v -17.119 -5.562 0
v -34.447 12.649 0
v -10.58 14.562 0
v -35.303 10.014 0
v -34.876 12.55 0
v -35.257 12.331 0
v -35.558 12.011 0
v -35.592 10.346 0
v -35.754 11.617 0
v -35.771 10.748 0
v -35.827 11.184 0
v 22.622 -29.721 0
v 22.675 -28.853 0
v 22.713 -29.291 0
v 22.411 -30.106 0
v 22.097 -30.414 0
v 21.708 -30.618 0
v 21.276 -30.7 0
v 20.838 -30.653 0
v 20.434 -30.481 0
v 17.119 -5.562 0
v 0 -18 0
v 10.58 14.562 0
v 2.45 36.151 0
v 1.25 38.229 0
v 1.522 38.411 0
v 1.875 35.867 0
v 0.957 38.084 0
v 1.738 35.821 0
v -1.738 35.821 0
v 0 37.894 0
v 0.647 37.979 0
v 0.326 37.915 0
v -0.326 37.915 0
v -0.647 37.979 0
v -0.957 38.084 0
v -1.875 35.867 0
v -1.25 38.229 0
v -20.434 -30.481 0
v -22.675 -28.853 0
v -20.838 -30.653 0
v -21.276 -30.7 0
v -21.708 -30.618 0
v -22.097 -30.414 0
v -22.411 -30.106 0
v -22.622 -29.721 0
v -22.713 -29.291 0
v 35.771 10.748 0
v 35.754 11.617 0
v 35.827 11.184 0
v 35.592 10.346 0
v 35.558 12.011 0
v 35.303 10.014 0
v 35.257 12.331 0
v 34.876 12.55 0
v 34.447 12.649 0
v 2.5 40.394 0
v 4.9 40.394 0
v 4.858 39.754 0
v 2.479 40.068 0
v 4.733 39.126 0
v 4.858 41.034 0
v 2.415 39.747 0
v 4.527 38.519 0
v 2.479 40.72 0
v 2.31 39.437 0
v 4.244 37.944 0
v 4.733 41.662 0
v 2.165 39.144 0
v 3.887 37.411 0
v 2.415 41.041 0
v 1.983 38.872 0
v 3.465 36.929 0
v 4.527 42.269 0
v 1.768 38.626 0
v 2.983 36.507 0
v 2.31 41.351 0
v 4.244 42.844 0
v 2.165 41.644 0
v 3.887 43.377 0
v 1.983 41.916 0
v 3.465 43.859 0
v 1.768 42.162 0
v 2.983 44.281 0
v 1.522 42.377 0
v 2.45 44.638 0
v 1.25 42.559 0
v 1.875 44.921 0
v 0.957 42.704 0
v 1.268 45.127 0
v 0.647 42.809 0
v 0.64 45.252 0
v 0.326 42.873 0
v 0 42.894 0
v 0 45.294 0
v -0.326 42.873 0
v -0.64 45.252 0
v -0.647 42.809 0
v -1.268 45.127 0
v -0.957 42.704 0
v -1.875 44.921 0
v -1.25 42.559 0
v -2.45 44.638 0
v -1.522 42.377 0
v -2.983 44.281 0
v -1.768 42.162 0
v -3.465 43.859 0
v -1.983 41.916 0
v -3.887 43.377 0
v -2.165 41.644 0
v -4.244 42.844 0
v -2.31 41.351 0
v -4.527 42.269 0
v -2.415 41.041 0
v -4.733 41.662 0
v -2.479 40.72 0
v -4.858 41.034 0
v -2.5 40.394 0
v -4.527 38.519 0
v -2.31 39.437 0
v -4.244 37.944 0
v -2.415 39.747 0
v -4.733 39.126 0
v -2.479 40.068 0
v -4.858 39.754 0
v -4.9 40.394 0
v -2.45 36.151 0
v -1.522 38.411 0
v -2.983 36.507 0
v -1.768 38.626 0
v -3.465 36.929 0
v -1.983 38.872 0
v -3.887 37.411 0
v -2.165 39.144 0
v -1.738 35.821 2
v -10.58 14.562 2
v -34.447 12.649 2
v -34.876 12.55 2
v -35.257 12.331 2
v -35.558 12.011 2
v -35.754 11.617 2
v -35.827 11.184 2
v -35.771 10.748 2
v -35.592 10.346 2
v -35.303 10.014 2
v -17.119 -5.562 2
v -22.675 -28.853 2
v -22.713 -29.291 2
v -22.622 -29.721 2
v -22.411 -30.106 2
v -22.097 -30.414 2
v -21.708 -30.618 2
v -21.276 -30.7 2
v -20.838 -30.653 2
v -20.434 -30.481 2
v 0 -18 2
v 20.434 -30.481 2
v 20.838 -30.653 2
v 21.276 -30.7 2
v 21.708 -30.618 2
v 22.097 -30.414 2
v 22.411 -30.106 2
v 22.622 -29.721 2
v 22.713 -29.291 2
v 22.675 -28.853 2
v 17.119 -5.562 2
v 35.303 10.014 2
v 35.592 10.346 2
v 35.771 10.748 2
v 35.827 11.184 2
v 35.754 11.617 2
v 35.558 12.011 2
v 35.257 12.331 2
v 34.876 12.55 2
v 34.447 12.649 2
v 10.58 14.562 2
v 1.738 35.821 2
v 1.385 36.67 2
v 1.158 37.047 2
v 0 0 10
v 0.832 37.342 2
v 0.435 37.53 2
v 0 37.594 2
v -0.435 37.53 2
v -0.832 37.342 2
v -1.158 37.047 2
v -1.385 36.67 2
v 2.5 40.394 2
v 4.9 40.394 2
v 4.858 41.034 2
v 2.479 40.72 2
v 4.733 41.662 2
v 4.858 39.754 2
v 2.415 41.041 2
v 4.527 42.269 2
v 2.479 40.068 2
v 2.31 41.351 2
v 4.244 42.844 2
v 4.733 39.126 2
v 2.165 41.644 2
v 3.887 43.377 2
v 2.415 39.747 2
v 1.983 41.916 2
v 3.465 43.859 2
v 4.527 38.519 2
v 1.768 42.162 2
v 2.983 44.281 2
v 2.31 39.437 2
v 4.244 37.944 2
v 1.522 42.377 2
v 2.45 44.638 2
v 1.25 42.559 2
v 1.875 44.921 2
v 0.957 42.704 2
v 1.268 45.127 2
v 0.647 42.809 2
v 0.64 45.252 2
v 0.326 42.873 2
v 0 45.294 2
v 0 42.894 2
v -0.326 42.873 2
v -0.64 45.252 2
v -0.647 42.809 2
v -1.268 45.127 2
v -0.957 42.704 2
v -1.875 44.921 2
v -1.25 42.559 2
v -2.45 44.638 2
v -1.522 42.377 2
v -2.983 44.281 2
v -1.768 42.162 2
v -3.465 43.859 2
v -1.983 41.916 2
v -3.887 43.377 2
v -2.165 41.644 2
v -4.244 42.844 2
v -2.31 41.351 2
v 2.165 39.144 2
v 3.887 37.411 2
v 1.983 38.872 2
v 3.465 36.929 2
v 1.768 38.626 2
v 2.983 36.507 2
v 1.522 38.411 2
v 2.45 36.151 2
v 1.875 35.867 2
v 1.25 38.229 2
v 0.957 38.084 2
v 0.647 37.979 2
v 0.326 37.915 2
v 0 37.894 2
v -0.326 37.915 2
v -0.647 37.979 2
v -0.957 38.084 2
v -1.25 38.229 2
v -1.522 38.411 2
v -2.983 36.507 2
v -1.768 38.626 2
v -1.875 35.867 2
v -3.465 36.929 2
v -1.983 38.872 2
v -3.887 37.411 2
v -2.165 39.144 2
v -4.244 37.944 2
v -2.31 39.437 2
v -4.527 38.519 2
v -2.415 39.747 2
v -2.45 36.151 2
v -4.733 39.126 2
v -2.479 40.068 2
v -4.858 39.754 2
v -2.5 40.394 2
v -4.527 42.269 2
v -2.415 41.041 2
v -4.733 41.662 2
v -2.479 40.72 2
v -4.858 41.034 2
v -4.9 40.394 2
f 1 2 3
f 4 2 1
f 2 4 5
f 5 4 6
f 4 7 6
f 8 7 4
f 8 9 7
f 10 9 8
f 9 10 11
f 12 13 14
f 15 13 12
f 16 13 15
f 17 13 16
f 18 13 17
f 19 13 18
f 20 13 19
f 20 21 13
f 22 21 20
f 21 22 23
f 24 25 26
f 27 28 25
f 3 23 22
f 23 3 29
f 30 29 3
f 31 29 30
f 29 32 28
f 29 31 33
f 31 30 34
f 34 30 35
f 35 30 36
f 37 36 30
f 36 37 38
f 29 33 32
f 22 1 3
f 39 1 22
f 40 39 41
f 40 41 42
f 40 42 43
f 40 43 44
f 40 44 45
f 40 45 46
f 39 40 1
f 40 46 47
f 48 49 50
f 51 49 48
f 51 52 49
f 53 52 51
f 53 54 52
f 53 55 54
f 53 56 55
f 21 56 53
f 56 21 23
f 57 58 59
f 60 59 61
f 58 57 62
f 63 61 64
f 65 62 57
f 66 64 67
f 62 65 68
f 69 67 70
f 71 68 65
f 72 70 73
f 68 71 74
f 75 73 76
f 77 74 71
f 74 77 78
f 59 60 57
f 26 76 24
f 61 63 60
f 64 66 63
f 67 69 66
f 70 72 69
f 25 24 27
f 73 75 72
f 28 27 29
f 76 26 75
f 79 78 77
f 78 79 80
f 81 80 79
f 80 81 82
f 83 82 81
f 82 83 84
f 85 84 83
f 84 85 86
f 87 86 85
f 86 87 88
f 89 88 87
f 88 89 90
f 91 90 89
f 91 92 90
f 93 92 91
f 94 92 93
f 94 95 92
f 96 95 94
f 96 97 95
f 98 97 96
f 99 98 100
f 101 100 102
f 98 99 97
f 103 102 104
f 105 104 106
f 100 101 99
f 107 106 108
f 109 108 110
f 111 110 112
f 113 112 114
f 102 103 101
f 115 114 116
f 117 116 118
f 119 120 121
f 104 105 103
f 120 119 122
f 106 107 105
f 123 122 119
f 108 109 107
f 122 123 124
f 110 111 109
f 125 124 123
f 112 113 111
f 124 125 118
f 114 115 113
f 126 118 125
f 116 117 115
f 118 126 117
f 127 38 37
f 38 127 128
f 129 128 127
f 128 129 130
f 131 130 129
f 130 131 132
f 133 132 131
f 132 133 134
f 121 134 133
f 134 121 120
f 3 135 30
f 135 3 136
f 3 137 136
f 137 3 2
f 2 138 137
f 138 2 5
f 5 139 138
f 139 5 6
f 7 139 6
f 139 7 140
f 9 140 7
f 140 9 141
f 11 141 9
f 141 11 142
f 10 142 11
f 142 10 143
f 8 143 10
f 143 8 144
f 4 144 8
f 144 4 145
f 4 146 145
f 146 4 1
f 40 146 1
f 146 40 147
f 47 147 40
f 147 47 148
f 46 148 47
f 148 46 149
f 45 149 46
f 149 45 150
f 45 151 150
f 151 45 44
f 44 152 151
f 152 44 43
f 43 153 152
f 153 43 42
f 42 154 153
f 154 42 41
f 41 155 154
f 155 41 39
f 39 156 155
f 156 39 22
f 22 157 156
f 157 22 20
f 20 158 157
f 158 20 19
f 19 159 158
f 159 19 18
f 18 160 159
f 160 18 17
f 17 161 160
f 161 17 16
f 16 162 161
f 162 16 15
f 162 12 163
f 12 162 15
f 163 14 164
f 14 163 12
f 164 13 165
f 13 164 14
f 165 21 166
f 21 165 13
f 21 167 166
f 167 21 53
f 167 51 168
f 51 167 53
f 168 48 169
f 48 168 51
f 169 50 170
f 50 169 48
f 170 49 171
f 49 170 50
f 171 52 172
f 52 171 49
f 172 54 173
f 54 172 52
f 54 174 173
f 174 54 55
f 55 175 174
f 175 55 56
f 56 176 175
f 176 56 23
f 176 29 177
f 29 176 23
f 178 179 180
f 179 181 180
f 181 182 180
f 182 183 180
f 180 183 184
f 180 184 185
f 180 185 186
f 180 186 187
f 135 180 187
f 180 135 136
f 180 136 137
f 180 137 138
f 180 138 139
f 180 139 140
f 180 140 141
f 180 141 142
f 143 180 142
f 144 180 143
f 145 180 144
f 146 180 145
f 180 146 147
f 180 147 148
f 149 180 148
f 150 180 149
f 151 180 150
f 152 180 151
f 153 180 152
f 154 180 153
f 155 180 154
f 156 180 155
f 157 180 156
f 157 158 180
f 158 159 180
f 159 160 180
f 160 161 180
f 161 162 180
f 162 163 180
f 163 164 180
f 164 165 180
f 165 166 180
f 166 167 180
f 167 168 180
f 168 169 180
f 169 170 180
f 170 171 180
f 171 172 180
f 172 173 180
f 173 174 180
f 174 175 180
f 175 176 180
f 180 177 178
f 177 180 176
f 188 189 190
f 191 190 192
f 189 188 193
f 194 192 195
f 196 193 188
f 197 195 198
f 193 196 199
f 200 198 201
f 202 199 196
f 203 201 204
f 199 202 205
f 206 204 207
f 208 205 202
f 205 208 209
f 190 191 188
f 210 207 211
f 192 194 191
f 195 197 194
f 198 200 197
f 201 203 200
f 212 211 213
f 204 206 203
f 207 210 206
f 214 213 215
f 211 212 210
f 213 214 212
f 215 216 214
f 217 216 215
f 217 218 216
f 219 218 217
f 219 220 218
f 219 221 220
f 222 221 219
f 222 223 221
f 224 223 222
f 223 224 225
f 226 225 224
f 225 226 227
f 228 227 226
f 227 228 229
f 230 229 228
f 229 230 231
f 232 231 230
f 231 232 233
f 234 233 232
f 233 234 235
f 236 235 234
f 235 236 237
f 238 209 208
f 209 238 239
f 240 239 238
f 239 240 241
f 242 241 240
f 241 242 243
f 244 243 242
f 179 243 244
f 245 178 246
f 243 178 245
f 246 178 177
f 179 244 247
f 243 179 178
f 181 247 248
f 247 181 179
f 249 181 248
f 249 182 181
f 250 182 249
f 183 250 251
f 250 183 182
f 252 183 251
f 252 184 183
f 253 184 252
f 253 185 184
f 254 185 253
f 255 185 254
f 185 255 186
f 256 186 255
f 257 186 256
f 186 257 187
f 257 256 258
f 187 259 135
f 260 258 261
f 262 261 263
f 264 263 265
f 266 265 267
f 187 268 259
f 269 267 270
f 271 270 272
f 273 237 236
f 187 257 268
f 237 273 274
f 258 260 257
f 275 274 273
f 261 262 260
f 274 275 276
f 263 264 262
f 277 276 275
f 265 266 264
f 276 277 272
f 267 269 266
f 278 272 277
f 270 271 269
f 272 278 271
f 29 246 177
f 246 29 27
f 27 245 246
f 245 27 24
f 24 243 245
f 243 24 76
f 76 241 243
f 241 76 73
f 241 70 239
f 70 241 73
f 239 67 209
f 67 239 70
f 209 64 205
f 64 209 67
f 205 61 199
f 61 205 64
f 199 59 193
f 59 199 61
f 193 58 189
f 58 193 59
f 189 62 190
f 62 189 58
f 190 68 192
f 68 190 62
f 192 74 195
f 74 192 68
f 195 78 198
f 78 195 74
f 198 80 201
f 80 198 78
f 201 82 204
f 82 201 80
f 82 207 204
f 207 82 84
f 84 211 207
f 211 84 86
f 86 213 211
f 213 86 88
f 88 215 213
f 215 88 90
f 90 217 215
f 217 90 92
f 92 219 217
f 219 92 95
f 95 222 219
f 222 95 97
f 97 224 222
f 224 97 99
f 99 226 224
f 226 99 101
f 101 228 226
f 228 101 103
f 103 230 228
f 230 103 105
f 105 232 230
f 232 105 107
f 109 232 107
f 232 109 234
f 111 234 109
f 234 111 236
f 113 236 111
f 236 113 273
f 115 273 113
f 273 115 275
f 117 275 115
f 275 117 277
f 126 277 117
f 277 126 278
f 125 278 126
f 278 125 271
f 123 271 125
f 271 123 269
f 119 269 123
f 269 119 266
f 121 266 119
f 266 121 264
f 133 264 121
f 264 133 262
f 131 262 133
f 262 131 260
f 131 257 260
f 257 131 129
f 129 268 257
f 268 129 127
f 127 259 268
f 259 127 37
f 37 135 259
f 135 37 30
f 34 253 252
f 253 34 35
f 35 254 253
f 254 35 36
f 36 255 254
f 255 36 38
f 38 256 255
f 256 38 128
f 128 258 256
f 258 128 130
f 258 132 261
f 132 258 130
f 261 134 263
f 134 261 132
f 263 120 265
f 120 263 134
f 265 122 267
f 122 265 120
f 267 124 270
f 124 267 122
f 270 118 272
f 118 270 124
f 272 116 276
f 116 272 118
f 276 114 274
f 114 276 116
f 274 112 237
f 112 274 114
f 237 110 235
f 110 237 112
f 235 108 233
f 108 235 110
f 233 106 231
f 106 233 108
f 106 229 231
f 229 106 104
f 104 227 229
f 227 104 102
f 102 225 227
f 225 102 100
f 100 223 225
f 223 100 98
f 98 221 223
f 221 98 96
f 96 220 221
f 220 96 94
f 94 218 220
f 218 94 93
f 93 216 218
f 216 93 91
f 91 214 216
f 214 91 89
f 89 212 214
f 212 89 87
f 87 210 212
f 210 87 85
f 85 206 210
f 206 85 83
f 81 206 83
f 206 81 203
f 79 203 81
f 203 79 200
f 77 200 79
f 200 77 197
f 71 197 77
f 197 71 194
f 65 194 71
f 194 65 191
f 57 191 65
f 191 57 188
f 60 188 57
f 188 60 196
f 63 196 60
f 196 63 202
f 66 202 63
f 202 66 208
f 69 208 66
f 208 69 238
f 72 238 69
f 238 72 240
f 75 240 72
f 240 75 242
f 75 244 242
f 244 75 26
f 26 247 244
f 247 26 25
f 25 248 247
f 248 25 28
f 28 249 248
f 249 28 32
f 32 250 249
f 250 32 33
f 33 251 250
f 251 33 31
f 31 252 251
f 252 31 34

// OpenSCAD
// ── ESTRELA FACETADA PARA PENDURAR ──
// Estrela de N pontas com a frente em bico (facetas até ao centro) e as costas planas, para
// imprimir deitada sem suportes. Leva uma argola na ponta de cima para o fio.
// A mesma conta está em Maker_Pro_Frontend_Prod/lib/decoracao.ts (pré-visualização).
//
// Parâmetros: pontas, raio (mm, ponta), interior (% do raio), altura_relevo, base (mm),
//   argola (true/false), diametro_argola (furo, mm), arredondar (raio das pontas, mm — para não
//   magoar; 0 = em bico)

function _np() = is_undef(pontas) ? 5 : max(3, round(pontas));
function _R()  = is_undef(raio) ? 40 : raio;
function _ri() = _R() * (is_undef(interior) ? 45 : interior) / 100;
function _hr() = is_undef(altura_relevo) ? 8 : altura_relevo;
function _b()  = is_undef(base) ? 2 : base;
function _arg() = is_undef(argola) || argola == true || argola == 1;
function _da() = is_undef(diametro_argola) ? 5 : diametro_argola;

function _rp() = max(0, is_undef(arredondar) ? 1.5 : arredondar);
function _vert(i) = let(a = 90 + i * 180 / _np(), r = (i % 2 == 0) ? _R() : _ri()) [r * cos(a), r * sin(a)];
// meio ângulo da ponta (graus) e quanto a ponta recua quando se arredonda
function _meio() = let(P = _vert(0), Q = _vert(1), u = (Q - P) / norm(Q - P)) acos(-P * u / norm(P));
function _recuo() = _rp() > 0 ? _rp() / sin(_meio()) - _rp() : 0;
NARCO = 8;                                         // segmentos do arco de cada ponta
// contorno 2D: nas pontas (i par) um arco de raio _rp() tangente às duas arestas
function _contorno() = [for (i = [0 : 2 * _np() - 1]) each
    (i % 2 == 1 || _rp() <= 0) ? [_vert(i)] :
    let(P = _vert(i), dir = P / norm(P), m = _meio(), c = P - dir * (_rp() / sin(m)), a0 = atan2(dir[1], dir[0]),
        abre = 90 - m)                              // o arco vai de a0 − (90 − m) a a0 + (90 − m)
    [for (k = [0 : NARCO]) let(a = a0 - abre + 2 * abre * k / NARCO) c + _rp() * [cos(a), sin(a)]]];

module estrela() {
    L = _contorno(); M = len(L);
    pts = concat([for (q = L) [q[0], q[1], 0]], [for (q = L) [q[0], q[1], _b()]],
                 [[0, 0, 0], [0, 0, _b() + _hr()]]);
    C = 2 * M; A = C + 1;
    faces = concat(
        [for (i = [0 : M - 1]) [C, (i + 1) % M, i]],                                         // costas
        [for (i = [0 : M - 1], t = [[i, (i + 1) % M, M + (i + 1) % M], [i, M + (i + 1) % M, M + i]]) t],   // lados
        [for (i = [0 : M - 1]) [A, M + i, M + (i + 1) % M]]                                  // facetas
    );
    polyhedron(points = pts, faces = [for (f = faces) [f[2], f[1], f[0]]], convexity = 3);
}

module argola() {
    ri = _da() / 2; ro = ri + 2.4;
    translate([0, _R() - _recuo() + ri + 0.3, 0])        // encostada à ponta (arredondada) de cima
        linear_extrude(height = max(_b(), 2))
            difference() { circle(r = ro, $fn = 48); circle(r = ri, $fn = 48); }
}

union() {
    estrela();
    if (_arg()) argola();
}
